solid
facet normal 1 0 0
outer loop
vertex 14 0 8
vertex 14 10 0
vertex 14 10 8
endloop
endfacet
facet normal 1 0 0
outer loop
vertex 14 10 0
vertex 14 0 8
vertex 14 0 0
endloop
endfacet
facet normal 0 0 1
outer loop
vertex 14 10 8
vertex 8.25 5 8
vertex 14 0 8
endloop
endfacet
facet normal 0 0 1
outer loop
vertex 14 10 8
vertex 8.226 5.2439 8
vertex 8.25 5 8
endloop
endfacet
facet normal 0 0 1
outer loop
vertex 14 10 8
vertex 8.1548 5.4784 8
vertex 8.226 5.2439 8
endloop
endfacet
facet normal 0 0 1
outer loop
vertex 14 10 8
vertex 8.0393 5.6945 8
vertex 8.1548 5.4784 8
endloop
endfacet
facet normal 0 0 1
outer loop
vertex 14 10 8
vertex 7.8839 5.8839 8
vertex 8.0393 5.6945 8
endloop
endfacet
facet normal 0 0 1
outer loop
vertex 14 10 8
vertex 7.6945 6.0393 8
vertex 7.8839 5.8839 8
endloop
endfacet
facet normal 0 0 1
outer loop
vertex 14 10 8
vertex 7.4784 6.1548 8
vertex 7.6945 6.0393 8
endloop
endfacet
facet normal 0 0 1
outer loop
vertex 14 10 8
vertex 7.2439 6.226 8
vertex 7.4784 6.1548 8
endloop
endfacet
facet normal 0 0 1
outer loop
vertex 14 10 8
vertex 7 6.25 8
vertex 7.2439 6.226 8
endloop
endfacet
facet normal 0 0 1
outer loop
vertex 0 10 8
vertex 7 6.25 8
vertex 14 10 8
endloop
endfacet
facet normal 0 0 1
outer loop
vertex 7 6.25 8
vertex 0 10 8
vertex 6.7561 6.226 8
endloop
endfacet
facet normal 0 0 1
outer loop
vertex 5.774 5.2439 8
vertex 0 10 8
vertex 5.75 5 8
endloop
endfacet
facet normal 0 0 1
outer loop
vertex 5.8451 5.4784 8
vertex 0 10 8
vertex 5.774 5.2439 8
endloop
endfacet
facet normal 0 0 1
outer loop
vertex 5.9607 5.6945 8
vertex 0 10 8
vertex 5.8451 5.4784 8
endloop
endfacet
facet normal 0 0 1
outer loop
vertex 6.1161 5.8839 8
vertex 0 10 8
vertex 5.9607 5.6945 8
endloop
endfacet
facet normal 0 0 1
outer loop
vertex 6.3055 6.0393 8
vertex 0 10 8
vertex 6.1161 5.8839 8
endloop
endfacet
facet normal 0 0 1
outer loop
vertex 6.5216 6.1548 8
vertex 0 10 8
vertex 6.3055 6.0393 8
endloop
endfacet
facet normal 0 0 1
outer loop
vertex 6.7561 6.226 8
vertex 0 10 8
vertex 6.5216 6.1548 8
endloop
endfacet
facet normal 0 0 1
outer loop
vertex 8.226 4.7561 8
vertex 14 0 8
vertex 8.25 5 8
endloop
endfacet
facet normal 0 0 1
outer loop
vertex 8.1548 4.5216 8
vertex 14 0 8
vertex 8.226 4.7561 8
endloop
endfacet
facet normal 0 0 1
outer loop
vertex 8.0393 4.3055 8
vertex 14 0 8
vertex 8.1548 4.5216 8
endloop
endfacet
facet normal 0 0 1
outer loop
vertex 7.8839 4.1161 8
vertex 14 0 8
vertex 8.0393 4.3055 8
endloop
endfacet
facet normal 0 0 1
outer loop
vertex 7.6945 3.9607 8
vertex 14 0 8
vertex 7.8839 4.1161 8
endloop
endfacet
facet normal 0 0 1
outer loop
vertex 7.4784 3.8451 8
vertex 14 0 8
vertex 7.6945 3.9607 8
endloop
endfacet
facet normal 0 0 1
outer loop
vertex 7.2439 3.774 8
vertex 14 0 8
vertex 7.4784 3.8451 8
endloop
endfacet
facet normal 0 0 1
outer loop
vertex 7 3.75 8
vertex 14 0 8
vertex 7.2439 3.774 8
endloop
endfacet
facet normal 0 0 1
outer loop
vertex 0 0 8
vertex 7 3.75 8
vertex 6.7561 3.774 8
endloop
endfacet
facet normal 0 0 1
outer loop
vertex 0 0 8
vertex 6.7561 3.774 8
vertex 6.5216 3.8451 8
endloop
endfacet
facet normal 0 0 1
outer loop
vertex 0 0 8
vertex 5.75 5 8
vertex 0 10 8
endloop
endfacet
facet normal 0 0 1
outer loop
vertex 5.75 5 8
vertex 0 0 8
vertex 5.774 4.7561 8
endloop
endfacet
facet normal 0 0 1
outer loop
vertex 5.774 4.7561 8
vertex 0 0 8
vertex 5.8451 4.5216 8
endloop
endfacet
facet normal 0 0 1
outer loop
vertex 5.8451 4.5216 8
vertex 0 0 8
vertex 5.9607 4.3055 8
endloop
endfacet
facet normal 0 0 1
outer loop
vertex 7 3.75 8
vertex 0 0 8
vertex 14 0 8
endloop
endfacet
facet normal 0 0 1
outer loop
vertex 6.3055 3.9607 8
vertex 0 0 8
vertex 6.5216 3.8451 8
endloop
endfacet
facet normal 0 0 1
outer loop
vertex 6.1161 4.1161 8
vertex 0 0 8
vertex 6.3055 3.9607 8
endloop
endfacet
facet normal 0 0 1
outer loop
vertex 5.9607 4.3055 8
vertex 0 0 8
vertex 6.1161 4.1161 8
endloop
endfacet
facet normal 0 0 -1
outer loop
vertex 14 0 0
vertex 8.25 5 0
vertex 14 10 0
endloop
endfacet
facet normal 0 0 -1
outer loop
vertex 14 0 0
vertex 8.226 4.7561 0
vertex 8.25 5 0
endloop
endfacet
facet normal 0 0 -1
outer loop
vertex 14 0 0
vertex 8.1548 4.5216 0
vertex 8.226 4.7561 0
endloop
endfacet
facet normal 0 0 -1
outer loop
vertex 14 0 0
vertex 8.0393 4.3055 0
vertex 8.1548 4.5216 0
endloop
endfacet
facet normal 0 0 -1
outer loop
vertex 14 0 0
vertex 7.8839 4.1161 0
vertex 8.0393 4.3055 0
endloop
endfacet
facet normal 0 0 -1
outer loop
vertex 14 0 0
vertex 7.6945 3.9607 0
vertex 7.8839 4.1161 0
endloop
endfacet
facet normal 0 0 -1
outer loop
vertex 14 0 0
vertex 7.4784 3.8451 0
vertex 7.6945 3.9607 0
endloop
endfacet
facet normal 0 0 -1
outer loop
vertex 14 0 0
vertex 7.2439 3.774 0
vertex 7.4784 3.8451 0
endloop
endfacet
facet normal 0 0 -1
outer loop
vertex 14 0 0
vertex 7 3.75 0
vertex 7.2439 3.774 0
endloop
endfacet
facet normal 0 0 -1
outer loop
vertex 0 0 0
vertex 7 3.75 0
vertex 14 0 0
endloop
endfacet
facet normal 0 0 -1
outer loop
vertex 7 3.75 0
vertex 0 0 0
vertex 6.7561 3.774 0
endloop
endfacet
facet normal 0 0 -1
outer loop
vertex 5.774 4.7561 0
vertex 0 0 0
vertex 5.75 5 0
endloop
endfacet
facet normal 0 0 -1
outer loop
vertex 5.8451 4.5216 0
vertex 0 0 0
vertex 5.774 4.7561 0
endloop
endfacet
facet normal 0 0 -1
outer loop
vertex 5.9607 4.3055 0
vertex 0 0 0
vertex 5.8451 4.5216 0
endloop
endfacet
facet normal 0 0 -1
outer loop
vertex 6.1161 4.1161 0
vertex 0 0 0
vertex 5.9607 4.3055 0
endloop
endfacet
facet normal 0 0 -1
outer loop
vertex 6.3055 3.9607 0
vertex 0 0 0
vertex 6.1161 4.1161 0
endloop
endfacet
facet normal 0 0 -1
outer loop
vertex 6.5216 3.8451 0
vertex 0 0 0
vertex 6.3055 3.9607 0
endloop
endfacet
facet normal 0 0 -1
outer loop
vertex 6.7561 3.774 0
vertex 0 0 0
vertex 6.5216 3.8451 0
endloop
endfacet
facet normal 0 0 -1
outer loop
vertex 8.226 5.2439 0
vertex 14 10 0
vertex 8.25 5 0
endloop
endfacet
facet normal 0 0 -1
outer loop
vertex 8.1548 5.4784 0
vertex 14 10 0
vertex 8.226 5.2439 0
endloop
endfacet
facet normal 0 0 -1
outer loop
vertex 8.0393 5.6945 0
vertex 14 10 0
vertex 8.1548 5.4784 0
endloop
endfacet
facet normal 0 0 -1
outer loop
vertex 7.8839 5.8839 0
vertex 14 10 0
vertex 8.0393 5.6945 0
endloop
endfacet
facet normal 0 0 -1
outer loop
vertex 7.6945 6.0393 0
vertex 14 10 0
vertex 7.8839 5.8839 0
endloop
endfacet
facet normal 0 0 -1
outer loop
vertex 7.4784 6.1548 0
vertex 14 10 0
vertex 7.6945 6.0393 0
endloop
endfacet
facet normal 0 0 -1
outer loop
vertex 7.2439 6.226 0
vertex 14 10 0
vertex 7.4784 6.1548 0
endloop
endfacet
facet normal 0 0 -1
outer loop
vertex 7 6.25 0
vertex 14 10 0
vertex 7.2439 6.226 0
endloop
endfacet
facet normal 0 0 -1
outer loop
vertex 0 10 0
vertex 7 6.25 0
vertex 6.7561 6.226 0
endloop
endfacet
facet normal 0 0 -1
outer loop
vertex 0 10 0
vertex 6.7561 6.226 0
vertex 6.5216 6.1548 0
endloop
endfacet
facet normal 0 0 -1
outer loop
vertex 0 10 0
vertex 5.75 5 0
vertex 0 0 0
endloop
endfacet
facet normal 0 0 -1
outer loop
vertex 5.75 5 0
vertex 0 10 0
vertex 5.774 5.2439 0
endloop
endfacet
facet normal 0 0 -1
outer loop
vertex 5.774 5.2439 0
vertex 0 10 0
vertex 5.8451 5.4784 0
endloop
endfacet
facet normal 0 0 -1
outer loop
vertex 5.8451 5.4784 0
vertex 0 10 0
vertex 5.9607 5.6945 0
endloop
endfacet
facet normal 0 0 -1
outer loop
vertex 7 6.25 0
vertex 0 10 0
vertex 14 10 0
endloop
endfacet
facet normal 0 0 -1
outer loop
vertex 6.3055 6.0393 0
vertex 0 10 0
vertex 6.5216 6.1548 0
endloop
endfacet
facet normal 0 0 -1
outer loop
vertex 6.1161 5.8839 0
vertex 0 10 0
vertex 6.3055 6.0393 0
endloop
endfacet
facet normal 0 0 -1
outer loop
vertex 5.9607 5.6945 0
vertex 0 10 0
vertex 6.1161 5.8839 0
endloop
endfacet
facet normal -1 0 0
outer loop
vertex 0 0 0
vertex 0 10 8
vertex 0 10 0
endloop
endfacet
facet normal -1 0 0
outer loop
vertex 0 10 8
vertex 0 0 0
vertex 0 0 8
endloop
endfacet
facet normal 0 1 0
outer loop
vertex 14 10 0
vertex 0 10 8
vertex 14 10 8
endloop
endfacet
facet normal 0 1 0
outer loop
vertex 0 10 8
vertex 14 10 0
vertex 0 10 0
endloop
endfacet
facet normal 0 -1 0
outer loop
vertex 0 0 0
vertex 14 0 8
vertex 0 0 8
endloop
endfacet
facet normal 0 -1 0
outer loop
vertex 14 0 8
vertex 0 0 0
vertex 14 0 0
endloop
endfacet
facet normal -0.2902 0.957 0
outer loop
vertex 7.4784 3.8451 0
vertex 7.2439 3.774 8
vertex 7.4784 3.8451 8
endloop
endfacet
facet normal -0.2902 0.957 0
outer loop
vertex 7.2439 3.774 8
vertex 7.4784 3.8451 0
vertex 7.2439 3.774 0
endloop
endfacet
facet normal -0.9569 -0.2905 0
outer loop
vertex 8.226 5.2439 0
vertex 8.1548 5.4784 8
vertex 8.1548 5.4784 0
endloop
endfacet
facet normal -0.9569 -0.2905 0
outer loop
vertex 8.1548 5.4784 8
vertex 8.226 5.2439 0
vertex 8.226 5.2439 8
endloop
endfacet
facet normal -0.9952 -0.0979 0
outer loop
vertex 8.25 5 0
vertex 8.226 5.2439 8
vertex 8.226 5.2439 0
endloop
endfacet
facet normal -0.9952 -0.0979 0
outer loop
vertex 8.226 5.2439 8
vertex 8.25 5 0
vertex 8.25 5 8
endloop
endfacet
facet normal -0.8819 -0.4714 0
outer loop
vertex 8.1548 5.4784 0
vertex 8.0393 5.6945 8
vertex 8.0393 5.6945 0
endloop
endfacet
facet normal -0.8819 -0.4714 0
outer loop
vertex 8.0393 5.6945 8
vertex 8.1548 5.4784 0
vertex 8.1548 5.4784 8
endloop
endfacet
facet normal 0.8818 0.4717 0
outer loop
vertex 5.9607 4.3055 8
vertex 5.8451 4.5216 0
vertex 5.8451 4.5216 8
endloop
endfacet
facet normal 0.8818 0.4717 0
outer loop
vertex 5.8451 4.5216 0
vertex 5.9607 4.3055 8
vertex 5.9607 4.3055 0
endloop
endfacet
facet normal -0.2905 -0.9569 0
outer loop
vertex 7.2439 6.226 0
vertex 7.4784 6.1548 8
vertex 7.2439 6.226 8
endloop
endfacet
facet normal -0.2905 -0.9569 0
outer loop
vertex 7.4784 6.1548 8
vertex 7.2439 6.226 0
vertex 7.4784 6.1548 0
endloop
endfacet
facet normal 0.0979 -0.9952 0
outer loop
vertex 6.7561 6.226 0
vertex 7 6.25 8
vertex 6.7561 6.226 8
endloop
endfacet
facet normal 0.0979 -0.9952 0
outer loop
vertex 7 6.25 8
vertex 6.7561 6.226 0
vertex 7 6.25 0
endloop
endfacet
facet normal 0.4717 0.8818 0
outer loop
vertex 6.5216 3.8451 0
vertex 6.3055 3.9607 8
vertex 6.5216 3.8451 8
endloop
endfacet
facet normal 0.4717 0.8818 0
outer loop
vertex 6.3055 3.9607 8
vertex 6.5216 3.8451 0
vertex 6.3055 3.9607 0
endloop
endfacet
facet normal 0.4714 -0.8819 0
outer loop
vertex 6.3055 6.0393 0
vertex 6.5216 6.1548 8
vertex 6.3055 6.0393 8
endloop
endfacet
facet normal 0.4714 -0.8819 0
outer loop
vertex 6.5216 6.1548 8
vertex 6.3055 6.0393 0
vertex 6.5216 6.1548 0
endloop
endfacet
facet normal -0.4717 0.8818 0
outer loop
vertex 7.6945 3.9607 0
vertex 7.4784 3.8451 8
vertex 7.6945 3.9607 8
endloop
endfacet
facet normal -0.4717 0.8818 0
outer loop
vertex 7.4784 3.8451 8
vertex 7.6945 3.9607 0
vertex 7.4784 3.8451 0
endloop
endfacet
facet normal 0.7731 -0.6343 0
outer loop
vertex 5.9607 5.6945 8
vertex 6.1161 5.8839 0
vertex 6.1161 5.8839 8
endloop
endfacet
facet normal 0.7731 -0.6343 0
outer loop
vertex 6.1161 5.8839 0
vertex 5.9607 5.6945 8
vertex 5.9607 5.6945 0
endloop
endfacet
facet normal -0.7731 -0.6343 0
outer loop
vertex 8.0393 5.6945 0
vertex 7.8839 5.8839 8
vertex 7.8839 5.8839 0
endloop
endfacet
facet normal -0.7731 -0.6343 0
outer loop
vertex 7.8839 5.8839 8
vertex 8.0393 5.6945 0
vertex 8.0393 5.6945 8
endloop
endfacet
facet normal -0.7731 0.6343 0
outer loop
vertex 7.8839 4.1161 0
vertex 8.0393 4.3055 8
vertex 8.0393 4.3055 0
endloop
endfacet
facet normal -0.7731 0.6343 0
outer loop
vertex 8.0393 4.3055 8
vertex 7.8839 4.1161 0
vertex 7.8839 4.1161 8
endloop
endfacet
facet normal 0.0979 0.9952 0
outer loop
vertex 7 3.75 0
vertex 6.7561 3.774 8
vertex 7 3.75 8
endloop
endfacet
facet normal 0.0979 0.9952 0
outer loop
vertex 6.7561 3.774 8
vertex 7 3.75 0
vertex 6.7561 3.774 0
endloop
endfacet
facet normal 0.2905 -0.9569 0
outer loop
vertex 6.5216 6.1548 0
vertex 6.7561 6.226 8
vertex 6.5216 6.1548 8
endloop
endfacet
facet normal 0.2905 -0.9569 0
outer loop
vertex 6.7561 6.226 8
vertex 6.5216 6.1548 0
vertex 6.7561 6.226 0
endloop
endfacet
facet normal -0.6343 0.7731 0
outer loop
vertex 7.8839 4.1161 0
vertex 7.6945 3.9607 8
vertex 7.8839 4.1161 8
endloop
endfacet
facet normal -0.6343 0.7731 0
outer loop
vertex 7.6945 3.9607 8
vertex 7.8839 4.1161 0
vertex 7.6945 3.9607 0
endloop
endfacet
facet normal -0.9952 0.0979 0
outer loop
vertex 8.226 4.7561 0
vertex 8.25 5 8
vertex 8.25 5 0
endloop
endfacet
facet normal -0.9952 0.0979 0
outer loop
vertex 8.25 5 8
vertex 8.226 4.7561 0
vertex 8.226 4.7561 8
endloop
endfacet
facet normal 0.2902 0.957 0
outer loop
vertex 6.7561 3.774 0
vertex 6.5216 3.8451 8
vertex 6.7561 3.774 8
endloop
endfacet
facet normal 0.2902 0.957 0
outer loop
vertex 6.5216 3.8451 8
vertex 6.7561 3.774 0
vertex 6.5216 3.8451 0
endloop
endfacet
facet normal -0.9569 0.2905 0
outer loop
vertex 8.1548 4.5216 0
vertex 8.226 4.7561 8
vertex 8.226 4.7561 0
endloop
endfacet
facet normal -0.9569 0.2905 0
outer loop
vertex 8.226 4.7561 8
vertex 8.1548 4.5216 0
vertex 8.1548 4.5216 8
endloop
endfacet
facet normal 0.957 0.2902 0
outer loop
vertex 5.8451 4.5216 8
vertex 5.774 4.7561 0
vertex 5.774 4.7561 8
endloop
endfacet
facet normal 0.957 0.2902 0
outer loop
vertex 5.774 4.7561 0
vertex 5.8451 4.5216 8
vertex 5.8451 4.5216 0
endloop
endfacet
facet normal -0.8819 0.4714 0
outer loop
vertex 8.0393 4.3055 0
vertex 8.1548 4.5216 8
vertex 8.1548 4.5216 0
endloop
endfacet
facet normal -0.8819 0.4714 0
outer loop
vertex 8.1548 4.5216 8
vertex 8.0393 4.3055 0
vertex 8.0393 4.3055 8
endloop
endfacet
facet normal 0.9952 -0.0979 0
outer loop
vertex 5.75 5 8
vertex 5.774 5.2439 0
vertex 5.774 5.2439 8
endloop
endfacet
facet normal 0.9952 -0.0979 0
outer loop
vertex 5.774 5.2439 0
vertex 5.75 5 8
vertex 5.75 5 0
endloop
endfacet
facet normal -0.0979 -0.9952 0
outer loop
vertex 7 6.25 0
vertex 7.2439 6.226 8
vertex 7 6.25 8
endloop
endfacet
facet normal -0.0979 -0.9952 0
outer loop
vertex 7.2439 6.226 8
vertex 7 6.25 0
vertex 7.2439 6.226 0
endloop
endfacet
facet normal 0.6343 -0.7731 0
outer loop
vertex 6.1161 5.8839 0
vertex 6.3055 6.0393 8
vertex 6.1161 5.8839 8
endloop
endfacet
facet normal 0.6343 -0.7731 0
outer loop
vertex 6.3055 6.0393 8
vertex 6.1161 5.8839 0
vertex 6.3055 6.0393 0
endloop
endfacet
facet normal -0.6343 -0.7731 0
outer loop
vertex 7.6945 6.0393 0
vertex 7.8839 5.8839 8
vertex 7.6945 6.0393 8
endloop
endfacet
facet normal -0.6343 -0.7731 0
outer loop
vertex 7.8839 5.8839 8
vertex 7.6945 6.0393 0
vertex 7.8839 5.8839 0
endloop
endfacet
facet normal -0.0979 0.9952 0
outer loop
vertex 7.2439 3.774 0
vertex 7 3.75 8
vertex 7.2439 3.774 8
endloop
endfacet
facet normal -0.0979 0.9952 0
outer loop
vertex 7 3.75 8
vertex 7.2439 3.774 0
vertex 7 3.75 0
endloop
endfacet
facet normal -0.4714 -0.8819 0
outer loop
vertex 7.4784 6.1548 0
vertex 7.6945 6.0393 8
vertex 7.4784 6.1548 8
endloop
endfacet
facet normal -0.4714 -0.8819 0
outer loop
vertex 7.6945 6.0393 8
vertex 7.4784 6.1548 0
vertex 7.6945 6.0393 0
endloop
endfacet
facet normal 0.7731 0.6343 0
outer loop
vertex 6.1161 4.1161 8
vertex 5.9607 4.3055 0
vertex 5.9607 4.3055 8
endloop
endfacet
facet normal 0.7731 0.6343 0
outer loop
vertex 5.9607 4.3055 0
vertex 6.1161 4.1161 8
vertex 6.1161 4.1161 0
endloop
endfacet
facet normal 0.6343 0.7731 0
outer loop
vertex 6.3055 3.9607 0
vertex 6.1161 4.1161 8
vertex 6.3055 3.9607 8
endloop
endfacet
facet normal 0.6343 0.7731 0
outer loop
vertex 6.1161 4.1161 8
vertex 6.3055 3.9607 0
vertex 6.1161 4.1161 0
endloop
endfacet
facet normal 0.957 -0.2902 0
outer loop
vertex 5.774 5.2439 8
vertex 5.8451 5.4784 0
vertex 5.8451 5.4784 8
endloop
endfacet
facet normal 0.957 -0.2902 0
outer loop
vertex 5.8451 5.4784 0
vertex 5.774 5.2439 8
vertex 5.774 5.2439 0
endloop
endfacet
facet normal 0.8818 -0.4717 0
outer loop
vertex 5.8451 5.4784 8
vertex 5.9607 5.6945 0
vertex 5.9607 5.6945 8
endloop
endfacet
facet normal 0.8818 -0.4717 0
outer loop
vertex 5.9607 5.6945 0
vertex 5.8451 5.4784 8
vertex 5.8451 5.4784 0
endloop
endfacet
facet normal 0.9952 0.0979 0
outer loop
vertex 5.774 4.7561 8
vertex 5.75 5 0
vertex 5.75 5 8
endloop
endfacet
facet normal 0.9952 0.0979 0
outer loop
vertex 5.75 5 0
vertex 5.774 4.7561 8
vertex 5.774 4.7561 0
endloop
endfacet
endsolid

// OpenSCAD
$fn = 32;

// ----------------------------------------------------------------------
// Micro pad: drilled pad, 5-20 mm class
// ----------------------------------------------------------------------

// --- parameters (mm) ---
pad_l = 14;               // pad length, X
pad_w = 10;               // pad width, Y
pad_t = 8;                // pad thickness, Z
hole_d = 2.5;             // through hole diameter

difference() {
  cube([pad_l, pad_w, pad_t]);
  translate([pad_l / 2, pad_w / 2, -1])
    cylinder(h = pad_t + 2, d = hole_d);
}
